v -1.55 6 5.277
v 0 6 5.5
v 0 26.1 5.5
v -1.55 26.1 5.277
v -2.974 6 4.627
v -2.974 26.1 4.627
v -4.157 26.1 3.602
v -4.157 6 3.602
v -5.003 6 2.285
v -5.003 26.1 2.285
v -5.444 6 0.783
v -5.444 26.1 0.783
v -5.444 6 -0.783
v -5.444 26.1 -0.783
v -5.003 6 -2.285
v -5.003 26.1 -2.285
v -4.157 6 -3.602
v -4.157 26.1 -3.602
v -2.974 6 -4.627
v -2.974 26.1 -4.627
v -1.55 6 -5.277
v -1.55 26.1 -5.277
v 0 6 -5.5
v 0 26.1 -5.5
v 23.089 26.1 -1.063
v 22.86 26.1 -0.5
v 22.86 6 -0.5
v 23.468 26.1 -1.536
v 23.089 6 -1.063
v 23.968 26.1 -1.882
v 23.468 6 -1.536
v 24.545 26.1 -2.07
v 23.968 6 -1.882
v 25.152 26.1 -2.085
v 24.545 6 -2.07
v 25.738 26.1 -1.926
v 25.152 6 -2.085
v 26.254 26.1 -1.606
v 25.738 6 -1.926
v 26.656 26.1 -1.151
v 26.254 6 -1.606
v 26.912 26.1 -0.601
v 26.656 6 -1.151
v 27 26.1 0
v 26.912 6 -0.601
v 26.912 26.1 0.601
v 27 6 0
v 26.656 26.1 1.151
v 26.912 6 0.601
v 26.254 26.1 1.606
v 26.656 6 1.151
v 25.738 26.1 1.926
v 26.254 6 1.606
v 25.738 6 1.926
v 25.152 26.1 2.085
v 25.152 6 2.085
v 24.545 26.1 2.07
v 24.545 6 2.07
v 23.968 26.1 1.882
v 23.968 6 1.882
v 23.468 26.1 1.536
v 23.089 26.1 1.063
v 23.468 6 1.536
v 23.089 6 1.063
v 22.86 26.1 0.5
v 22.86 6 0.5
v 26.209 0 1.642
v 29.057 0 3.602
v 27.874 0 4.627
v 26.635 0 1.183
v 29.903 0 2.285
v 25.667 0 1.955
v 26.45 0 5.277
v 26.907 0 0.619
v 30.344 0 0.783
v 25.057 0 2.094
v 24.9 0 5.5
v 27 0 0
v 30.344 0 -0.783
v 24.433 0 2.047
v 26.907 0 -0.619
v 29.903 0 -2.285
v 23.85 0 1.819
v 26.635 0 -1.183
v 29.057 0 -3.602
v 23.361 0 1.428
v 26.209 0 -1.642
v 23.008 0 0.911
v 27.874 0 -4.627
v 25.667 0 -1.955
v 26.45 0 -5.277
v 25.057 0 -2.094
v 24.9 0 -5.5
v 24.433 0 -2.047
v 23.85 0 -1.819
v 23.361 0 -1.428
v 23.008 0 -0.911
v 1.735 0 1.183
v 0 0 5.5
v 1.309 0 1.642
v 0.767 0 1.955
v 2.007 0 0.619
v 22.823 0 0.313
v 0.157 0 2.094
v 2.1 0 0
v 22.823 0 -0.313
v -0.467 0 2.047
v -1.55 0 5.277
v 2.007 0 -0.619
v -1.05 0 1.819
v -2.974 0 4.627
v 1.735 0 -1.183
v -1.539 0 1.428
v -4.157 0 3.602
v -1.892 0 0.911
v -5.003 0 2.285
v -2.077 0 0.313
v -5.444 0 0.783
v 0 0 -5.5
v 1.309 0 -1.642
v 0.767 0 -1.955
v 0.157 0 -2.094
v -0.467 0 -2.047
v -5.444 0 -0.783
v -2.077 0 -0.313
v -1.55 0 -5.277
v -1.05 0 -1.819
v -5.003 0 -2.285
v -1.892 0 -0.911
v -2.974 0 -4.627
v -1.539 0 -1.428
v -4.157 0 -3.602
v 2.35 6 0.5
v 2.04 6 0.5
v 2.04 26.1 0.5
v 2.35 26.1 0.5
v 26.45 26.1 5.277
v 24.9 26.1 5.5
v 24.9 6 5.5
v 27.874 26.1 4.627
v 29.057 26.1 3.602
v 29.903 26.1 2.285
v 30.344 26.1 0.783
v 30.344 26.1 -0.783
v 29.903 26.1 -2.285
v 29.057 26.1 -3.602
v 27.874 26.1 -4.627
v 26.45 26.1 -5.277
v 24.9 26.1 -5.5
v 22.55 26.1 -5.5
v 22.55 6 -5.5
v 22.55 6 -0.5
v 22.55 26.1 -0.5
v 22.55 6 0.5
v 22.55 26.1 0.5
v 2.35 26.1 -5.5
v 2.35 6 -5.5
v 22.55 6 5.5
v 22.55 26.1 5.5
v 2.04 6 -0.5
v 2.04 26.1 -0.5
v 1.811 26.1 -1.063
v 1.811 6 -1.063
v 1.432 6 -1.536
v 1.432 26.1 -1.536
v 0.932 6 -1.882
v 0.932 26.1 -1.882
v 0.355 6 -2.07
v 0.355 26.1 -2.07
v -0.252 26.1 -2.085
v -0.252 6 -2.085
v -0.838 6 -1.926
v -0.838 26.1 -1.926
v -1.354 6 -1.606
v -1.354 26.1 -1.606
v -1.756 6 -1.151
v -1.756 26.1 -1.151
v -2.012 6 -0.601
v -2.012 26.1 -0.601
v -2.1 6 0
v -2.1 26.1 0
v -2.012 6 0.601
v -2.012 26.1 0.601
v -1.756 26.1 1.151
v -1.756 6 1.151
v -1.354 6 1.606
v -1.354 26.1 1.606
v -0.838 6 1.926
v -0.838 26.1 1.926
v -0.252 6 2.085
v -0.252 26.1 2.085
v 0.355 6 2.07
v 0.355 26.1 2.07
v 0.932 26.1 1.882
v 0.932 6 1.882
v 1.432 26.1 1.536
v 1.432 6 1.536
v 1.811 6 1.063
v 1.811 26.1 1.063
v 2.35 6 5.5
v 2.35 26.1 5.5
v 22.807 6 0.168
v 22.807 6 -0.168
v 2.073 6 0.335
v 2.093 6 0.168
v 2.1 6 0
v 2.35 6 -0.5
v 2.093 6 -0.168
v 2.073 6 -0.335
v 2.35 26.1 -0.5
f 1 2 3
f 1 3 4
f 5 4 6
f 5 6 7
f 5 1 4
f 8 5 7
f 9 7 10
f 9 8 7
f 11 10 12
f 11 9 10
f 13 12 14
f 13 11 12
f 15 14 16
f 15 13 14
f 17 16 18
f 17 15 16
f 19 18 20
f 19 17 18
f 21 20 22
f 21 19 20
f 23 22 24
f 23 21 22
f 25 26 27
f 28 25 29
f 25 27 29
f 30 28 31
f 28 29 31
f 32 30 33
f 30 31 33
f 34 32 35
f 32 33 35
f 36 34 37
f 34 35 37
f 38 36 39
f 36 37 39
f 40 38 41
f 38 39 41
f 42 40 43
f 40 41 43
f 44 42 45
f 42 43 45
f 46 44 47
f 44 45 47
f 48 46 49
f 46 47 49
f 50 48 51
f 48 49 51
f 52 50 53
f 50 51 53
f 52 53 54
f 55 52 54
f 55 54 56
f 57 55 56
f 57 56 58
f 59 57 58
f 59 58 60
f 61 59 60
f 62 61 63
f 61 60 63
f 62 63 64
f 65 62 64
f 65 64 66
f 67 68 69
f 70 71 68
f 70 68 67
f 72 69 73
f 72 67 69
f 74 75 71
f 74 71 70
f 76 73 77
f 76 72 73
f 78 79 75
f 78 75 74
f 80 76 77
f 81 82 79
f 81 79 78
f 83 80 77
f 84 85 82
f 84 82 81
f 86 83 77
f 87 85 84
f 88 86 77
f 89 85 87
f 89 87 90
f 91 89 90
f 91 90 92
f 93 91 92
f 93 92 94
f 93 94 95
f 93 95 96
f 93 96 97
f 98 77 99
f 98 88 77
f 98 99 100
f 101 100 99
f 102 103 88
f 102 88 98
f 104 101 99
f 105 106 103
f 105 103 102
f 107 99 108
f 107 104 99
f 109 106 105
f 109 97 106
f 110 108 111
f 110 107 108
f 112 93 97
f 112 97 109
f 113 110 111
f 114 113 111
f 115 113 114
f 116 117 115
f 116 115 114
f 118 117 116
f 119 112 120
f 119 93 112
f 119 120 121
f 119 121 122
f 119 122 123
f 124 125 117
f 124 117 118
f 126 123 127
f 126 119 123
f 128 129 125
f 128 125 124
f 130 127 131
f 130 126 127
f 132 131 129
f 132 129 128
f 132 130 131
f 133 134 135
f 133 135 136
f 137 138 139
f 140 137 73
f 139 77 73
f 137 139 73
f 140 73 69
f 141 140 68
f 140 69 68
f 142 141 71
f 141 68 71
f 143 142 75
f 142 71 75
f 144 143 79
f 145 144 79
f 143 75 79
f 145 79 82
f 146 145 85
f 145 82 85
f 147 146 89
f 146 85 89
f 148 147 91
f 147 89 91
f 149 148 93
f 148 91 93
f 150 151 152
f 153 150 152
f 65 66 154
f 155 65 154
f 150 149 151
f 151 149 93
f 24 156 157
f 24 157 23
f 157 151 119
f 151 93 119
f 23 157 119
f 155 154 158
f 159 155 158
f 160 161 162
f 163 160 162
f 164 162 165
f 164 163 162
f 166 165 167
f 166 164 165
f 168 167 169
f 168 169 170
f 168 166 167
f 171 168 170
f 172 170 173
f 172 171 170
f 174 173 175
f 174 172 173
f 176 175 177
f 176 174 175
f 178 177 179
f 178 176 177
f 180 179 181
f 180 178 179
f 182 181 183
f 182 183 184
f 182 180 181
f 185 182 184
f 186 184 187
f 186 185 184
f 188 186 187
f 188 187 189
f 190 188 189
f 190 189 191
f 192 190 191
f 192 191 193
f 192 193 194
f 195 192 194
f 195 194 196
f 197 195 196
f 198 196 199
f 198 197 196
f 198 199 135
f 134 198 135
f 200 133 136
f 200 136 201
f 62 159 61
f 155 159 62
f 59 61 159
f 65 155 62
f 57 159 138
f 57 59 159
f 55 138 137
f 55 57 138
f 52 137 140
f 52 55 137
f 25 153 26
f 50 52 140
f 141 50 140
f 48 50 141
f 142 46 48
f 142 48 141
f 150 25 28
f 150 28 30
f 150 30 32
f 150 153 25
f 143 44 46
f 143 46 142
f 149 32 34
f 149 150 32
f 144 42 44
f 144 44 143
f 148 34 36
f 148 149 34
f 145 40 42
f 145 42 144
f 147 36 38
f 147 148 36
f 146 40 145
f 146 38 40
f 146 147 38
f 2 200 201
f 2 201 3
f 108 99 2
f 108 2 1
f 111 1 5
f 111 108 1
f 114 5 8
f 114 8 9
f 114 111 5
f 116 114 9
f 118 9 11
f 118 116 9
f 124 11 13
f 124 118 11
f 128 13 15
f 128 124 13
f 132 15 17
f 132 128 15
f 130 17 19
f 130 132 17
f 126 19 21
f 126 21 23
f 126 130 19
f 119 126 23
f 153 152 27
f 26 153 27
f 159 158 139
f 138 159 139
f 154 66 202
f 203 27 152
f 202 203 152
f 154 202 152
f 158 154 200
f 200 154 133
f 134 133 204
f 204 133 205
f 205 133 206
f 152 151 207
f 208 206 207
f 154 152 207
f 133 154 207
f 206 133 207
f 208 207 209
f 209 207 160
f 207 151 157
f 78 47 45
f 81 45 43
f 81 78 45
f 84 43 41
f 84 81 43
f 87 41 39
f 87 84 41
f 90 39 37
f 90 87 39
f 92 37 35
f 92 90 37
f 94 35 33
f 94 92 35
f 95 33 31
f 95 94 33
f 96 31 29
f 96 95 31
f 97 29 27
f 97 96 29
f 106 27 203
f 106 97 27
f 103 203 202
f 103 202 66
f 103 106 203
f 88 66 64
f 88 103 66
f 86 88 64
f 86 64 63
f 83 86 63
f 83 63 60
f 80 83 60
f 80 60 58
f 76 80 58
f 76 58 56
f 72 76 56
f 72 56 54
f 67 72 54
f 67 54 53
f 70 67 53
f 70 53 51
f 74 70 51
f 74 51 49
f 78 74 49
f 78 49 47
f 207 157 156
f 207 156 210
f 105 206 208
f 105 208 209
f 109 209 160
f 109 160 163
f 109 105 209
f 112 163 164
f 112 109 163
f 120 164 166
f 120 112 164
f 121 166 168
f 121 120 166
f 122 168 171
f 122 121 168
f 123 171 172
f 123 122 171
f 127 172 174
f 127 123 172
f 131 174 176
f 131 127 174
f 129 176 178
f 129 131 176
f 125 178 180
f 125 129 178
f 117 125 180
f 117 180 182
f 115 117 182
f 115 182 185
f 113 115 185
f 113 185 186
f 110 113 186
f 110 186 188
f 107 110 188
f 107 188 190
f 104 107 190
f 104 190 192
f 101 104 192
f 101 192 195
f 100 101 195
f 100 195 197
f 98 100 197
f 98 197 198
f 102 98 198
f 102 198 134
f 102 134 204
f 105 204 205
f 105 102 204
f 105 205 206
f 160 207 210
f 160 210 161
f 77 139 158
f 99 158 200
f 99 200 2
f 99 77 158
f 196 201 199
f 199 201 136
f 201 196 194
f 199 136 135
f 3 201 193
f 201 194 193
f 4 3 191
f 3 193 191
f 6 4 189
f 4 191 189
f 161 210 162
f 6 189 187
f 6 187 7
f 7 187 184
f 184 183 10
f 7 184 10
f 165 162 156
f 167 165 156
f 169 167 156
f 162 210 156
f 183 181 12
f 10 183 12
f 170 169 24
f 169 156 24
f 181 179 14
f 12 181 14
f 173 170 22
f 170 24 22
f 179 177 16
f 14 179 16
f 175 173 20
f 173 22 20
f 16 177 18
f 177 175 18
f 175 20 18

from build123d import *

# Parameters (mm, degrees)
SKETCH1_R           = 2.1
BOSS_EXTRUDE1_DEPTH = 6
BOSS_EXTRUDE2_DEPTH = 20.1


with BuildPart() as part:
    # Sketch1 → Boss-Extrude1 (new body)
    with BuildSketch(Plane(origin=(0, 0, 0), x_dir=(1, 0, 0), z_dir=(0, 1, 0))):
        with BuildLine():
            Line((0, 5.5), (24.9, 5.5))
            ThreePointArc((24.9, 5.5), (30.4, 0), (24.9, -5.5))
            Line((24.9, -5.5), (0, -5.5))
            ThreePointArc((0, -5.5), (-5.5, 0), (0, 5.5))
        make_face()
        Circle(SKETCH1_R, mode=Mode.SUBTRACT)
        with Locations((24.9, 0)):
            Circle(SKETCH1_R, mode=Mode.SUBTRACT)
    extrude(amount=BOSS_EXTRUDE1_DEPTH)

    # Sketch2 → Boss-Extrude2 (add)
    with BuildSketch(Plane(origin=(0, 6, 0), x_dir=(1, 0, 0), z_dir=(0, 1, 0))):
        with BuildLine():
            Line((22.55, 5.5), (22.55, 0.5))
            Line((22.55, 0.5), (22.860392195, 0.5))
            ThreePointArc((22.860392195, 0.5), (27, 0), (22.860392195, -0.5))
            Line((22.860392195, -0.5), (22.55, -0.5))
            Line((22.55, -0.5), (22.55, -5.5))
            Line((22.55, -5.5), (24.9, -5.5))
            ThreePointArc((24.9, -5.5), (30.4, 0), (24.9, 5.5))
            Line((24.9, 5.5), (22.55, 5.5))
        make_face()
        with BuildLine():
            Line((2.35, 5.5), (2.35, 0.5))
            Line((2.35, 0.5), (2.039607805, 0.5))
            ThreePointArc((2.039607805, 0.5), (-2.1, 0), (2.039607805, -0.5))
            Line((2.039607805, -0.5), (2.35, -0.5))
            Line((2.35, -0.5), (2.35, -5.5))
            Line((2.35, -5.5), (0, -5.5))
            ThreePointArc((0, -5.5), (-5.5, 0), (0, 5.5))
            Line((0, 5.5), (2.35, 5.5))
        make_face()
    extrude(amount=BOSS_EXTRUDE2_DEPTH)


solid = part.part
